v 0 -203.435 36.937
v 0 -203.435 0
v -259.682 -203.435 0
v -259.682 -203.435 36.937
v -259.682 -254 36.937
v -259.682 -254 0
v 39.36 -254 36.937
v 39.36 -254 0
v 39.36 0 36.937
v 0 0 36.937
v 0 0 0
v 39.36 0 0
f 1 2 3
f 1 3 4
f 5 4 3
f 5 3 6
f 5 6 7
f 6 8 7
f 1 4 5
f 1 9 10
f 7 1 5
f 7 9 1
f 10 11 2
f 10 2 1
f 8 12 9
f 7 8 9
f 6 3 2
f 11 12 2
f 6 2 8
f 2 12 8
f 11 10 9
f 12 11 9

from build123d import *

# Parameters (mm, degrees)
F0_W     = 39.360307157
F0_H     = 36.9374714792
F1_DEPTH = 254
F2_W     = 50.564668417
F2_H     = 36.9374714792
F3_DEPTH = 259.6821213


# Not quite as in the source:
# - an extrude ends at something that could not be found from the text; its depth is read off the source's solid


with BuildPart() as f1:
    # F0 (on Front) → F1 (new body)
    with BuildSketch(Plane.XZ):
        with Locations((19.6801535785, 18.4687357396)):
            Rectangle(F0_W, F0_H)
    extrude(amount=F1_DEPTH)

    # F2 (on face) → F3 (join, through all)
    with BuildSketch(Plane(origin=(0, 0, 0), x_dir=(0, -1, 0), z_dir=(-1, 0, 0))):
        with Locations((228.7176657915, 18.4687357396)):
            Rectangle(F2_W, F2_H)
    extrude(amount=F3_DEPTH)


solid = f1.part
